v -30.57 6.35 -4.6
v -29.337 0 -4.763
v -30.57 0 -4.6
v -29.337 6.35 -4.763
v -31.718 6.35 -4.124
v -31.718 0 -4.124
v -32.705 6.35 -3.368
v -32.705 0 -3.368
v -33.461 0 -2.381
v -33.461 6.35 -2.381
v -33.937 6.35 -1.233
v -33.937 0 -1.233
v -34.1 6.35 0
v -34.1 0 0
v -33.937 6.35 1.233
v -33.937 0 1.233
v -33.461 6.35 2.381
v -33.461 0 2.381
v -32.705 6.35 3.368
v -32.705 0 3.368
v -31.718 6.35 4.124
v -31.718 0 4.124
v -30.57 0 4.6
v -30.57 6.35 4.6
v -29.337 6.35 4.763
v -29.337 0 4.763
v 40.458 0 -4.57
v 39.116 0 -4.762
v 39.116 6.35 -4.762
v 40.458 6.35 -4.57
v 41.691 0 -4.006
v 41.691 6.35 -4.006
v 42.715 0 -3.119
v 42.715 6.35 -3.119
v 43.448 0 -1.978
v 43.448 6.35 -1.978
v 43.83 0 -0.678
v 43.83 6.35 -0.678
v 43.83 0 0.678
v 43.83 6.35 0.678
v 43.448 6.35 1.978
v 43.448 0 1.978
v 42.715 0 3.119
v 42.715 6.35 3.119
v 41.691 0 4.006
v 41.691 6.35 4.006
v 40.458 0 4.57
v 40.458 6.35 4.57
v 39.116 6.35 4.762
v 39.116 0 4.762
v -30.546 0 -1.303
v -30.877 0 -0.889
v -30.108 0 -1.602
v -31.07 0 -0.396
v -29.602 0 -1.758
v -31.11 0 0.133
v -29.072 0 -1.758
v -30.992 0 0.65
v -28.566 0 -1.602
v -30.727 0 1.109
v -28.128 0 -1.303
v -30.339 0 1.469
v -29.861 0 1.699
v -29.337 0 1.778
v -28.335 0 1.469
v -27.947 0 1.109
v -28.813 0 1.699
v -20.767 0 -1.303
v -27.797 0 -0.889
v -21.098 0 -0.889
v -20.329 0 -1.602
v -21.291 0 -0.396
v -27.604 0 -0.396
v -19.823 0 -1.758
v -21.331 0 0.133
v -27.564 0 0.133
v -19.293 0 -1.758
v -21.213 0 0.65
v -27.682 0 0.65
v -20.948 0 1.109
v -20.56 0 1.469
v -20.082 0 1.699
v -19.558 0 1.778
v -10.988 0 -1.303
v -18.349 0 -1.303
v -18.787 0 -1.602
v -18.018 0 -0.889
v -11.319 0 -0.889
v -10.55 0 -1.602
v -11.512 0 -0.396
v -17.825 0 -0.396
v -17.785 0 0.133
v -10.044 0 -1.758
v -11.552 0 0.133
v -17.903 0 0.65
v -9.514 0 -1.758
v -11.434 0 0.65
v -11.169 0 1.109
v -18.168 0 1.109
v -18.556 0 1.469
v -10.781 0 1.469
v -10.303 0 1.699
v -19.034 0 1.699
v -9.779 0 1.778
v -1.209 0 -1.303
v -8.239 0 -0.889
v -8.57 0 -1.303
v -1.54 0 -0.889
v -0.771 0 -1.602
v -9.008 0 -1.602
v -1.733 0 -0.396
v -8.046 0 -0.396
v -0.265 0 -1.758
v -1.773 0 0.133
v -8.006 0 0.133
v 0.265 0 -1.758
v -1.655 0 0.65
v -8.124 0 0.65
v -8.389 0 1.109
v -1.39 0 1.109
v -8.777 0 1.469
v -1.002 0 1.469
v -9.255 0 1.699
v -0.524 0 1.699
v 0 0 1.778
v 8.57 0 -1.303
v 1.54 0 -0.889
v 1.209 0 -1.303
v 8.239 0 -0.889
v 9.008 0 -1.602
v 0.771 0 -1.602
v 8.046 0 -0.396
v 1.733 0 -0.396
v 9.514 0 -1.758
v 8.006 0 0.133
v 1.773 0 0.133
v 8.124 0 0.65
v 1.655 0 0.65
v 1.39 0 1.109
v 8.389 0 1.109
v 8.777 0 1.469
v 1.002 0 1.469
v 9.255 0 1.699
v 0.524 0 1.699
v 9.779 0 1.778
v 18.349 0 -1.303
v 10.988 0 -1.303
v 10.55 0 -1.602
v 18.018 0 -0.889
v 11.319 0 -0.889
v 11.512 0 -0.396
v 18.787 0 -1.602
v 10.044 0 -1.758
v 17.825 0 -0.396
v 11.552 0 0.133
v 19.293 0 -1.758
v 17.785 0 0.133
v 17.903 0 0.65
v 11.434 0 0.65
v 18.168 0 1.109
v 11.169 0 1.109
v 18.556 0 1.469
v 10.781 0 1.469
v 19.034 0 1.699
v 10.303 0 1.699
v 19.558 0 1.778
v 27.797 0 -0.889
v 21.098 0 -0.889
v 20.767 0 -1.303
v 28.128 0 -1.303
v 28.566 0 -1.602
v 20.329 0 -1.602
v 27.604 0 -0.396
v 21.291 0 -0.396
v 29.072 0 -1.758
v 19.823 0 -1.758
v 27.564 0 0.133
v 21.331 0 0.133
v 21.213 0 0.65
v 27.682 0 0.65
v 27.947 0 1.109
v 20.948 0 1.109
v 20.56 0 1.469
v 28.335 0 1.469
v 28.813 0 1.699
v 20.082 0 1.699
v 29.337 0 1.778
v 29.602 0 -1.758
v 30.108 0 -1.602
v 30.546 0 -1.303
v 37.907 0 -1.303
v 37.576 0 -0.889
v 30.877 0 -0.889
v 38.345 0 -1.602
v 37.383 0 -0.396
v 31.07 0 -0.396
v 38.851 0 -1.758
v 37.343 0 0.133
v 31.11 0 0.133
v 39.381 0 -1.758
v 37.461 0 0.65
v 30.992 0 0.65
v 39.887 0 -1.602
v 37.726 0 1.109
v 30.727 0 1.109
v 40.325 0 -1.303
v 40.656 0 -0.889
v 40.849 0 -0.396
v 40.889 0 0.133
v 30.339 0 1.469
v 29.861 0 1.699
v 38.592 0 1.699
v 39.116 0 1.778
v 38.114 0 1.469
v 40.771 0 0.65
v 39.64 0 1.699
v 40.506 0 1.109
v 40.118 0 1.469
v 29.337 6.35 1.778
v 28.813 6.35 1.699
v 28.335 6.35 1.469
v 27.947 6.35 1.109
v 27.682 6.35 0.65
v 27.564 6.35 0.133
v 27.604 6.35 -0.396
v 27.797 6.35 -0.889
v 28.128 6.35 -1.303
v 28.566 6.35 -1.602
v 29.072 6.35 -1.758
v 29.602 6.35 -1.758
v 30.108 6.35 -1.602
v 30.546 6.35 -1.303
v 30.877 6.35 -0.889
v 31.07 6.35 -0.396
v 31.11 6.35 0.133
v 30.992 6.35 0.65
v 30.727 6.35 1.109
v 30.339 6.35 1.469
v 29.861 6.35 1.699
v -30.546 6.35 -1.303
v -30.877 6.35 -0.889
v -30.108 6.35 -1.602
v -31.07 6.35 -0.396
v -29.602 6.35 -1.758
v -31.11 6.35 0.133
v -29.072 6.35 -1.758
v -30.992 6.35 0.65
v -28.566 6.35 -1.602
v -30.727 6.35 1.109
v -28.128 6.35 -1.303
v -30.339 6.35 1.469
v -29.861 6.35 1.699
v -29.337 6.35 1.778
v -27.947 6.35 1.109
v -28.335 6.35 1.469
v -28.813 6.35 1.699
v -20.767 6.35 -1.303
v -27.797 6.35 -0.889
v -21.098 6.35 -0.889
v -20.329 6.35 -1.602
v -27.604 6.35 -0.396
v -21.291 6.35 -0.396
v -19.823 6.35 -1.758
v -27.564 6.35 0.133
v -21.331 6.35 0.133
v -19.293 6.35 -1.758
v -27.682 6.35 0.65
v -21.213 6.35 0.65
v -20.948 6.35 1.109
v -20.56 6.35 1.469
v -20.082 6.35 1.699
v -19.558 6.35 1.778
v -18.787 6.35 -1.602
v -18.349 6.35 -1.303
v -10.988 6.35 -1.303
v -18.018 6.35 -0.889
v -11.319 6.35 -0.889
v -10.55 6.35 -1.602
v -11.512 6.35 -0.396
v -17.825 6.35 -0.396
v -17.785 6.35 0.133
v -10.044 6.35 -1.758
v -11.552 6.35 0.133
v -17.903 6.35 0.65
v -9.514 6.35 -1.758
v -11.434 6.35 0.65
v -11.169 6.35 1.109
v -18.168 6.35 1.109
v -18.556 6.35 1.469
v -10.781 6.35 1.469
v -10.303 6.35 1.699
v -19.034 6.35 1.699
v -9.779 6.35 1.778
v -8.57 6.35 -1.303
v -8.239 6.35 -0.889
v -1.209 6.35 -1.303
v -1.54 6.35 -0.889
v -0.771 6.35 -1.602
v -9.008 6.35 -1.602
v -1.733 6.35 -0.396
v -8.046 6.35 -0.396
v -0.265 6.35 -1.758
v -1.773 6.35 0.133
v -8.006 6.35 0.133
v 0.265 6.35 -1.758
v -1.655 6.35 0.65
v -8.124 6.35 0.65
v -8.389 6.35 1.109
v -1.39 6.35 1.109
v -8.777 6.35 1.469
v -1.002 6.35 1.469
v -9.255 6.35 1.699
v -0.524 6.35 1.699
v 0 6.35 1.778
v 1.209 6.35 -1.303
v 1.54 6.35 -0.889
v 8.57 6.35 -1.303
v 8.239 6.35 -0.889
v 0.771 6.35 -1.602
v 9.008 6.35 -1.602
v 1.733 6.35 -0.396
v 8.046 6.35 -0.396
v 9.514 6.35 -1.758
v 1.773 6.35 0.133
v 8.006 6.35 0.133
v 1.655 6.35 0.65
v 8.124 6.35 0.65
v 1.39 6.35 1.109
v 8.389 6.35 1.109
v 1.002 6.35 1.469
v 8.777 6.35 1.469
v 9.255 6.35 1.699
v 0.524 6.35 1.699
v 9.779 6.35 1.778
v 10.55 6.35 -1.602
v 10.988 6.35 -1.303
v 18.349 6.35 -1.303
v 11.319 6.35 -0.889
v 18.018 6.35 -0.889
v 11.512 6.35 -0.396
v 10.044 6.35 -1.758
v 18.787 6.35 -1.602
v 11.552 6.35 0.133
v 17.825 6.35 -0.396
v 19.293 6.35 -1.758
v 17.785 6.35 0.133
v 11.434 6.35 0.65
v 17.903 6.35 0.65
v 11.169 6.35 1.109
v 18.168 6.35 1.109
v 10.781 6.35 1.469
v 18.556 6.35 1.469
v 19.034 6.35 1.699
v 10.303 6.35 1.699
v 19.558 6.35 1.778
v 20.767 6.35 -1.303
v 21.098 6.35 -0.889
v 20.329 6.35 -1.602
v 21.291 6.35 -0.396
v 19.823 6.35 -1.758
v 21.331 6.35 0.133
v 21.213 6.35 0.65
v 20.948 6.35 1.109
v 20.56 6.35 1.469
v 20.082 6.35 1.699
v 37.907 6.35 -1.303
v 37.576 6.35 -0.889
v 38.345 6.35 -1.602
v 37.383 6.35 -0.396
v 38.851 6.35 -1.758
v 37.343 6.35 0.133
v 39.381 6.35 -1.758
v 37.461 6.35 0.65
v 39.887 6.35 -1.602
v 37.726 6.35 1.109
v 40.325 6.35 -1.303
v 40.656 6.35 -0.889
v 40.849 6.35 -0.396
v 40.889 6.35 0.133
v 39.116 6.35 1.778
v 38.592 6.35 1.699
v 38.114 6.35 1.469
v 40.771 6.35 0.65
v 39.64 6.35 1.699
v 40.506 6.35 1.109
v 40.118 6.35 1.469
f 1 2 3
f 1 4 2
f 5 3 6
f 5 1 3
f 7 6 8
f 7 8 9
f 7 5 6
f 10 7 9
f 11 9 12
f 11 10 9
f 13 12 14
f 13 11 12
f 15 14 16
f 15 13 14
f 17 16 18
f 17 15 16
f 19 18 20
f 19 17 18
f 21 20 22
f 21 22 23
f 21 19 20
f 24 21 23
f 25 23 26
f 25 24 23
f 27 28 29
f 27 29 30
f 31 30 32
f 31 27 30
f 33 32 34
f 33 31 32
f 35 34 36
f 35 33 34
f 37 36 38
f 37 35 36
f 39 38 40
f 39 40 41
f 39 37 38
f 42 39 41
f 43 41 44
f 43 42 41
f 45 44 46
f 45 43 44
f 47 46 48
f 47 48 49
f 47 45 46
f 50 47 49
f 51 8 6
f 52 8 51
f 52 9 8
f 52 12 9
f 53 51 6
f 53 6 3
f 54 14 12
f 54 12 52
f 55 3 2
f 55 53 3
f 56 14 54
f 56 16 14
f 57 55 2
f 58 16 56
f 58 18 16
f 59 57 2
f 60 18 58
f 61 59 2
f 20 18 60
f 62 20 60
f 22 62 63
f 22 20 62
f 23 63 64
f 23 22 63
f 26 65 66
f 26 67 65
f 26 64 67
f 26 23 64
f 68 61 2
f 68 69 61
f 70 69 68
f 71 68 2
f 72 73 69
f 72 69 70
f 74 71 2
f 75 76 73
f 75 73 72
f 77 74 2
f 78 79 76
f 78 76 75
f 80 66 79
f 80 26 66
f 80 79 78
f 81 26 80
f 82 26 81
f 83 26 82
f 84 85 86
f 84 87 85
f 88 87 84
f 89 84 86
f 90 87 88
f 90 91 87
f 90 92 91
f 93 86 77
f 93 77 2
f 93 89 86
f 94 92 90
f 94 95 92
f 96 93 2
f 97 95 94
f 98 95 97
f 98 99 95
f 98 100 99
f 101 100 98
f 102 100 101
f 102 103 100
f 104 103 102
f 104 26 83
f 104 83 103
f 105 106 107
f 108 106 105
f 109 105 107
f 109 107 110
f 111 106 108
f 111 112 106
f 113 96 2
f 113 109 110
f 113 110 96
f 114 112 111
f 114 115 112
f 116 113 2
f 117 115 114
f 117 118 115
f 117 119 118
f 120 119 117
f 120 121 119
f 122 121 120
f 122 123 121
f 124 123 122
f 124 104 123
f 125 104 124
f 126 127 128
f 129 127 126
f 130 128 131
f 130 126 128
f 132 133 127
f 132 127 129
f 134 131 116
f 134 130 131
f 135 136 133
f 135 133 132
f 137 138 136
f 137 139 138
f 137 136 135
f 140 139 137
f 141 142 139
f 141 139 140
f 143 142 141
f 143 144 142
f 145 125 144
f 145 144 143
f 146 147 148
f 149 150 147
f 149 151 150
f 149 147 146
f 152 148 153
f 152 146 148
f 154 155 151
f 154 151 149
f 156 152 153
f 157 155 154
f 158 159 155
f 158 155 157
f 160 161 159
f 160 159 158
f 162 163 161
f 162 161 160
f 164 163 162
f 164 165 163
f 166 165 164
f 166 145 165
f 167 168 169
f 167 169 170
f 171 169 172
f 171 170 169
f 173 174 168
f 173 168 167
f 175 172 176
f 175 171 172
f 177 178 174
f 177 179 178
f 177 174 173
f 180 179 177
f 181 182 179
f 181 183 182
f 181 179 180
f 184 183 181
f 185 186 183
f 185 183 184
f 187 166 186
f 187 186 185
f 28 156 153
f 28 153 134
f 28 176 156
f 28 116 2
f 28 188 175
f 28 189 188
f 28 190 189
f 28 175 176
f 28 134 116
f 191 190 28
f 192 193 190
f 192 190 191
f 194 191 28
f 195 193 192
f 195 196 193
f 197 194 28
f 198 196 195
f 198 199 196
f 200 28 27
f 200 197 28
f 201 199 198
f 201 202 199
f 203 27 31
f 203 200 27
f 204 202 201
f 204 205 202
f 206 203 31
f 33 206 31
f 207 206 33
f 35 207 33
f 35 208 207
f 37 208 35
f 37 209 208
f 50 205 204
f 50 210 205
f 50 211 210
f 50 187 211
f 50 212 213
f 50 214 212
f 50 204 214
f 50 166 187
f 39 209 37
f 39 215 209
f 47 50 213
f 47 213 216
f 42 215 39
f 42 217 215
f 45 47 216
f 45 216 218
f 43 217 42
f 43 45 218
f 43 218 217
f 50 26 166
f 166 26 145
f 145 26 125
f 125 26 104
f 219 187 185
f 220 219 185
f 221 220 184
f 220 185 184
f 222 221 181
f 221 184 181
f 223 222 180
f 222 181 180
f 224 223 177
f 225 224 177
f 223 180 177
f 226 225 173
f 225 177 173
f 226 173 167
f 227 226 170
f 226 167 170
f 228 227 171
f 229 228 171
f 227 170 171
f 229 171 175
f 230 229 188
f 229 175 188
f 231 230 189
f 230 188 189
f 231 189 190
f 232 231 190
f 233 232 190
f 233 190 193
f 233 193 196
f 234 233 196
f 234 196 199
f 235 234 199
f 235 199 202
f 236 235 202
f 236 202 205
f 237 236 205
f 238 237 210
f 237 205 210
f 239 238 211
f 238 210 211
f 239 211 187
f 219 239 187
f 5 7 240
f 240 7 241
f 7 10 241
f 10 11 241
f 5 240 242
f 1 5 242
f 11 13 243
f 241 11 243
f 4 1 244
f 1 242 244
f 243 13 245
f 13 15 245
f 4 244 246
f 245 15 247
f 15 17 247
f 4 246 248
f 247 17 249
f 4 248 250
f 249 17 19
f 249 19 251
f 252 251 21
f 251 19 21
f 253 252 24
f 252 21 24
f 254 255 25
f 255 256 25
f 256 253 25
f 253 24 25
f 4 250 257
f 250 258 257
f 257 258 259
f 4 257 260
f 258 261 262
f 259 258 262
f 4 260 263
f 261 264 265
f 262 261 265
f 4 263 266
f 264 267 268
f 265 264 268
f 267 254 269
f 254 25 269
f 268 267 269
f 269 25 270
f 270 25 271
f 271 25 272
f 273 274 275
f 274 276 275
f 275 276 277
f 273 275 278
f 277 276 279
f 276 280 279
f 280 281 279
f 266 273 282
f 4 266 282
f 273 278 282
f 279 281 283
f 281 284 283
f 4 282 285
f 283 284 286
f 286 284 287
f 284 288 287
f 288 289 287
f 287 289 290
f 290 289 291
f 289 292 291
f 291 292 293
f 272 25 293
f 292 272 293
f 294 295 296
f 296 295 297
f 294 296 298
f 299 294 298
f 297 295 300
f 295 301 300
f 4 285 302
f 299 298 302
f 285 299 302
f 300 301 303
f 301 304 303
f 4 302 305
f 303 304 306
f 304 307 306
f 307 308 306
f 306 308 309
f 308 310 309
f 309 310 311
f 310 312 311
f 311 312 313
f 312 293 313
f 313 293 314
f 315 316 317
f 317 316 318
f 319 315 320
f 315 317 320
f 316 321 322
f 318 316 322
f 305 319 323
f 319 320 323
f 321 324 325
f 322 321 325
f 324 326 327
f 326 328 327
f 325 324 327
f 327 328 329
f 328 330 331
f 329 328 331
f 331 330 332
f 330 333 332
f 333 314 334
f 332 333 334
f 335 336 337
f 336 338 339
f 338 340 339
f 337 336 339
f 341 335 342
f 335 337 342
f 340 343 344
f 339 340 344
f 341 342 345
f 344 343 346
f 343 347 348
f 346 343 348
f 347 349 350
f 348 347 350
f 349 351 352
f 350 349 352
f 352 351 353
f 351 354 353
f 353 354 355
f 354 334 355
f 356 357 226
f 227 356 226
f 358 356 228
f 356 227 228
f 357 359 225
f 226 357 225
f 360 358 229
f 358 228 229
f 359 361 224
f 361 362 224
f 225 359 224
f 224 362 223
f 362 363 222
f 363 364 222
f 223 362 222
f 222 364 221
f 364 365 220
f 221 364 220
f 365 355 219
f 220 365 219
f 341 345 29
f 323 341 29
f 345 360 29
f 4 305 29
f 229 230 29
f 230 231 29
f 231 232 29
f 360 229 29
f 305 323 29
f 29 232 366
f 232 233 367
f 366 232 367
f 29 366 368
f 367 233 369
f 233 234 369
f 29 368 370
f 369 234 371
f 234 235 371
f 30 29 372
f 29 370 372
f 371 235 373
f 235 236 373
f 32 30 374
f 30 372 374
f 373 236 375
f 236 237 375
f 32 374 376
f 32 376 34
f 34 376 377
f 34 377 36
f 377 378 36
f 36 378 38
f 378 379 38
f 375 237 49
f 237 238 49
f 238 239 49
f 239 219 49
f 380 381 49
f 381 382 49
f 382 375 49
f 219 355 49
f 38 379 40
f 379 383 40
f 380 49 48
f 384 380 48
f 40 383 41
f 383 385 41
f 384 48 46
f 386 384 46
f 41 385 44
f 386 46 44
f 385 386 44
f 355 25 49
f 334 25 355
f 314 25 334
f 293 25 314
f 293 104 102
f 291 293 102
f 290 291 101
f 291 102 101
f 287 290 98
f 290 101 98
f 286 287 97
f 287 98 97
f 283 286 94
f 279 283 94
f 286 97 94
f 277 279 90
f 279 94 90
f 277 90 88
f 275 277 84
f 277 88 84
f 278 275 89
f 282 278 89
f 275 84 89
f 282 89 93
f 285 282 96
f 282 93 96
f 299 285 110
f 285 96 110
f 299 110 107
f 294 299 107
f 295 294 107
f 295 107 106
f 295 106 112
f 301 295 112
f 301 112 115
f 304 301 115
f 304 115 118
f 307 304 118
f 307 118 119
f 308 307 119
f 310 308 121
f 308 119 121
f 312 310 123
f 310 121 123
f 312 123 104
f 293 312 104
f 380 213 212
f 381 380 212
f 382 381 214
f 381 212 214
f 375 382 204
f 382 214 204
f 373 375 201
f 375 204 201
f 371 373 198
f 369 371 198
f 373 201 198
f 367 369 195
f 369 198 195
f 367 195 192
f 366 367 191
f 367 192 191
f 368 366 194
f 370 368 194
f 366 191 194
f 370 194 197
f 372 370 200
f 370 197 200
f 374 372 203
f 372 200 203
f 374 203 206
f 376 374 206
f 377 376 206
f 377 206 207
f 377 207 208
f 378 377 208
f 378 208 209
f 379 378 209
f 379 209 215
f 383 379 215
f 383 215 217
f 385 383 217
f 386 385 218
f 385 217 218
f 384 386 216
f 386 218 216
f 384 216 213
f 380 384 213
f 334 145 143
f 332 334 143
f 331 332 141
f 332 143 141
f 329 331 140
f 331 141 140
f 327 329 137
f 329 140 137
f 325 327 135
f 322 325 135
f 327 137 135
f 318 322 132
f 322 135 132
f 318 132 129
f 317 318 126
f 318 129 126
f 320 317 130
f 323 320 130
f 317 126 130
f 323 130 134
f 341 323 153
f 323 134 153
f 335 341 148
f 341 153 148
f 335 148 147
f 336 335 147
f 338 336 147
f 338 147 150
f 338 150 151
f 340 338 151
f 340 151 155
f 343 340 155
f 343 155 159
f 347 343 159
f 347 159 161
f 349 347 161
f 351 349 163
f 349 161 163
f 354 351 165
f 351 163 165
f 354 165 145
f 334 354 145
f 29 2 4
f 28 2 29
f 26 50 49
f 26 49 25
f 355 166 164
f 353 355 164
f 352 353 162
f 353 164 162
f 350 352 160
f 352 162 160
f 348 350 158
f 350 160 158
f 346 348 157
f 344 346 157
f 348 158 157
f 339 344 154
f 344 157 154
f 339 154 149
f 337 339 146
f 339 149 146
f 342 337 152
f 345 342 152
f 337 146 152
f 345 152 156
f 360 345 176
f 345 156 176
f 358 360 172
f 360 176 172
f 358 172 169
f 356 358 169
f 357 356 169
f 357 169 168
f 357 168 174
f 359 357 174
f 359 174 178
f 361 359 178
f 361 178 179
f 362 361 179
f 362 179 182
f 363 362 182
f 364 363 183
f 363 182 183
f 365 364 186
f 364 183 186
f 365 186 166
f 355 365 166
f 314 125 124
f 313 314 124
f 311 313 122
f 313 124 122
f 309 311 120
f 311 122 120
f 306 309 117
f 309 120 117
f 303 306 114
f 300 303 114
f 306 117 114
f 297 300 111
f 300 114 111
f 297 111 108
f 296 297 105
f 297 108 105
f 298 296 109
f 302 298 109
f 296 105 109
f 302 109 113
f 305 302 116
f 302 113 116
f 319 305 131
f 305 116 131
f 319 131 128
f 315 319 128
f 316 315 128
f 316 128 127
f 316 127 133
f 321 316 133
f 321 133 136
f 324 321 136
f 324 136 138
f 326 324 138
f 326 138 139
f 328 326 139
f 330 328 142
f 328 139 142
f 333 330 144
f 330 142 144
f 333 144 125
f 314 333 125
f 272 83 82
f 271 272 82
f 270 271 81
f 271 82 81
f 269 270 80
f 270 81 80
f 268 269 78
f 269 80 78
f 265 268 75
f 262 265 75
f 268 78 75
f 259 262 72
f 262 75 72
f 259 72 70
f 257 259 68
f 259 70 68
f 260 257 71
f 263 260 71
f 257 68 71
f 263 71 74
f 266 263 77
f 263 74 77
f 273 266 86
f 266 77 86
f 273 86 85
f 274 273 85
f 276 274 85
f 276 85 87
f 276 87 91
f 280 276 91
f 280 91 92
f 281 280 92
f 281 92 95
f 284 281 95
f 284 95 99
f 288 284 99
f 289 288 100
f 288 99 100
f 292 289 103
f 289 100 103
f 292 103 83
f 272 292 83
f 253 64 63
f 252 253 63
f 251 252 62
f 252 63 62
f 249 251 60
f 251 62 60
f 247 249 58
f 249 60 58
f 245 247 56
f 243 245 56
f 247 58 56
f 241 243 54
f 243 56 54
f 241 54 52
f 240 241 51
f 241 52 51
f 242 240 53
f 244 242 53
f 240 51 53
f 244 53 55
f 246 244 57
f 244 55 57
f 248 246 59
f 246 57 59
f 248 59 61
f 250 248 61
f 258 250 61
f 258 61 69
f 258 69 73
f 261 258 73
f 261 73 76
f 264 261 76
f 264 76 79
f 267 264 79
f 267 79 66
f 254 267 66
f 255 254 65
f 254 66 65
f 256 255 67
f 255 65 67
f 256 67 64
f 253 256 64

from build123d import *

# Parameters (mm, degrees)
SKETCH1_R               = 1.778
BOSS_EXTRUDE1_DEPTH     = 6.35
CUT_EXTRUDE1_DEPTH      = 45.59065674
CUT_EXTRUDE1_DEPTH_BACK = 45.59065674
SKETCH2_W               = 15.126003495
SKETCH2_H               = 9.710924743
FILLET1_R               = 4.7625


with BuildPart() as part:
    # Sketch1 → Boss-Extrude1 (new body)
    with BuildSketch(Plane.XZ):
        with BuildLine():
            Line((-39.116, -4.7625), (39.116, -4.7625))
            ThreePointArc((39.116, -4.7625), (43.8785, 0), (39.116, 4.7625))
            Line((39.116, 4.7625), (-39.116, 4.7625))
            ThreePointArc((-39.116, 4.7625), (-43.8785, 0), (-39.116, -4.7625))
        make_face()
        with Locations(Location((39.116, 0, 0), (0, 0, 90))):
            Circle(SKETCH1_R, mode=Mode.SUBTRACT)
        with Locations(Location((29.337, 0, 0), (0, 0, 90))):
            Circle(SKETCH1_R, mode=Mode.SUBTRACT)
        with Locations(Location((19.558, 0, 0), (0, 0, 90))):
            Circle(SKETCH1_R, mode=Mode.SUBTRACT)
        with Locations(Location((9.779, 0, 0), (0, 0, 90))):
            Circle(SKETCH1_R, mode=Mode.SUBTRACT)
        with Locations(Location((0, 0, 0), (0, 0, 90))):
            Circle(SKETCH1_R, mode=Mode.SUBTRACT)
        with Locations(Location((-9.779, 0, 0), (0, 0, 90))):
            Circle(SKETCH1_R, mode=Mode.SUBTRACT)
        with Locations(Location((-19.558, 0, 0), (0, 0, 90))):
            Circle(SKETCH1_R, mode=Mode.SUBTRACT)
        with Locations(Location((-29.337, 0, 0), (0, 0, 90))):
            Circle(SKETCH1_R, mode=Mode.SUBTRACT)
        with Locations(Location((-39.116, 0, 0), (0, 0, 90))):
            Circle(SKETCH1_R, mode=Mode.SUBTRACT)
    extrude(amount=-BOSS_EXTRUDE1_DEPTH)

    # Sketch2 → Cut-Extrude1 (cut, two sides: drawn at the far end of the back side and taken through both)
    with BuildSketch(Plane(origin=(0, 6.35, 0), x_dir=(1, 0, 0), z_dir=(0, 1, 0)).offset(-CUT_EXTRUDE1_DEPTH_BACK)):
        with Locations((-41.662501748, 0.092962372)):
            Rectangle(SKETCH2_W, SKETCH2_H)
    extrude(amount=CUT_EXTRUDE1_DEPTH + CUT_EXTRUDE1_DEPTH_BACK, mode=Mode.SUBTRACT)

    # Fillet1
    fillet1_edges = [part.edges().sort_by_distance(p)[0] for p in [
        (-34.0995, 3.175, -4.7625),
        (-34.0995, 3.175, 4.7625),
    ]]
    fillet(fillet1_edges, radius=FILLET1_R - 0.0001)  # a hair under: the kernel refuses the full size


solid = part.part
